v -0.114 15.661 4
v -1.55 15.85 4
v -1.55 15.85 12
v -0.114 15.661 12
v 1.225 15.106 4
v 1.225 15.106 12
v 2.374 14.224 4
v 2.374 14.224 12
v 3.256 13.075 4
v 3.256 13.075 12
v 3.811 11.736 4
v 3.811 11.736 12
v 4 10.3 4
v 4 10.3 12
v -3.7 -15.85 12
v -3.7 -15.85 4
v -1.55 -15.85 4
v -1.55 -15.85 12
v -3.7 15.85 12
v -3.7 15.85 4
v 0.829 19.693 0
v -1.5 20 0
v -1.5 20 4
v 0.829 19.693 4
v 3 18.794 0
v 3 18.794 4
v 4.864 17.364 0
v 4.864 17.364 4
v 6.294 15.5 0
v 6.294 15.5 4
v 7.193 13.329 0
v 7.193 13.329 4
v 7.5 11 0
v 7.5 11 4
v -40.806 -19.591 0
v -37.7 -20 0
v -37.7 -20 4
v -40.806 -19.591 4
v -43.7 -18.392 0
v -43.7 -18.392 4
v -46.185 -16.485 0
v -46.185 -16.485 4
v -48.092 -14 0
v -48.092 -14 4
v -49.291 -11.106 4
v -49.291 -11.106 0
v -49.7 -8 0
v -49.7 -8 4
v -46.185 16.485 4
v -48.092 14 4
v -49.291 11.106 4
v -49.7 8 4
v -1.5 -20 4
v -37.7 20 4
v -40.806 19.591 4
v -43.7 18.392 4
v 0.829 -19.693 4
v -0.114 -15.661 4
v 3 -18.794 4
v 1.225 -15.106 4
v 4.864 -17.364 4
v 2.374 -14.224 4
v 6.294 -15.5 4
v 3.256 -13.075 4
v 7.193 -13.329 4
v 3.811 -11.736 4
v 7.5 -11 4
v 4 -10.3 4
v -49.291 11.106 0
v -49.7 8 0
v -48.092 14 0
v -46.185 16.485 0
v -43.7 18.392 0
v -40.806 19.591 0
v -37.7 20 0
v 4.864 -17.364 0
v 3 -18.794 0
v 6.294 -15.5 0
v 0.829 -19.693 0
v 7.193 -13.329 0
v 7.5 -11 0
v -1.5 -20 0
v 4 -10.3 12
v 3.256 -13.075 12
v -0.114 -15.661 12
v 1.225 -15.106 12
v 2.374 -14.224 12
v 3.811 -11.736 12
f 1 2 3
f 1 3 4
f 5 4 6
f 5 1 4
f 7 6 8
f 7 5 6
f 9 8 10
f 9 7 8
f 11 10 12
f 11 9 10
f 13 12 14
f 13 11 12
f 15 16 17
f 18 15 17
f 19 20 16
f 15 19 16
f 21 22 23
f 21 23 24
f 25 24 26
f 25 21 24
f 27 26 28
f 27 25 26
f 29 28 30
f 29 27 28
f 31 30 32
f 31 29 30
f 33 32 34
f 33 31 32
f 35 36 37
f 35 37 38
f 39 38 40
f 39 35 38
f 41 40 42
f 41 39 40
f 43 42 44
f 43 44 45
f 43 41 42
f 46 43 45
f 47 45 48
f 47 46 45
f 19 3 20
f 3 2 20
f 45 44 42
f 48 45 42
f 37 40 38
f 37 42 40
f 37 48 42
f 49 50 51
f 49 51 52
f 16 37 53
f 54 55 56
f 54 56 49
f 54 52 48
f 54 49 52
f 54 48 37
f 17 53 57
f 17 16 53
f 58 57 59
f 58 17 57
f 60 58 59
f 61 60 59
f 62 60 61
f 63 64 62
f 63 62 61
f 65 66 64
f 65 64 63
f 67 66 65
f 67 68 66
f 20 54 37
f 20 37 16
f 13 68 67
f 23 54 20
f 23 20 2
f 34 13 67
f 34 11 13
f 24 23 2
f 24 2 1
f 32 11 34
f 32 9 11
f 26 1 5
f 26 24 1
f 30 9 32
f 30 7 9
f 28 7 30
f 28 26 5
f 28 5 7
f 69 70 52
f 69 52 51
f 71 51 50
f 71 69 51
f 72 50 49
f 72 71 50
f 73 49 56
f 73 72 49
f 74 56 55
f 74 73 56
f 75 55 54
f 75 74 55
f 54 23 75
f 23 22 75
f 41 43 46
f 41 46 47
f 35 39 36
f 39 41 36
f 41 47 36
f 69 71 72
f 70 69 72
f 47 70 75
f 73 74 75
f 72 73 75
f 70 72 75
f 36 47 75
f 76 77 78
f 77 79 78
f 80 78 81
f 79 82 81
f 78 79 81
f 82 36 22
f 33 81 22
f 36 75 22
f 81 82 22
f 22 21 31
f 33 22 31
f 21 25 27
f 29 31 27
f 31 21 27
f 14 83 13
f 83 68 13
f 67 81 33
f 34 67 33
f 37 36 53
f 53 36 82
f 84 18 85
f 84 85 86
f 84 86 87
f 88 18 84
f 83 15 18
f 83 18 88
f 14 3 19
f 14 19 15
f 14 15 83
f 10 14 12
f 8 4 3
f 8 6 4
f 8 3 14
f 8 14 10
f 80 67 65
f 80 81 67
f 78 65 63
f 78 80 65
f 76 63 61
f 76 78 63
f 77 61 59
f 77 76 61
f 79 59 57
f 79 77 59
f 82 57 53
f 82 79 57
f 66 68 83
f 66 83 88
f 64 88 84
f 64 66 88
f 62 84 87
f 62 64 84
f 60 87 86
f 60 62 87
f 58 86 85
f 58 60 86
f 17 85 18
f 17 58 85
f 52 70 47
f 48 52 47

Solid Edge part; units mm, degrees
sketch "Sketch1" plane through (0, 0, 0) normal (0, 0, 1) x (1, 0, 0)
  line L0 (-1.55, 15.85) -> (-3.7, 15.85)
  line L1 (-3.7, 15.85) -> (-3.7, -15.85)
  line L2 (-3.7, -15.85) -> (-1.55, -15.85)
  arc A0 (-1.55, -15.85) -> (4, -10.3) centre (-1.55, -10.3) ccw
  line L3 (4, -10.3) -> (4, 10.3)
  arc A1 (-1.55, 15.85) -> (4, 10.3) centre (-1.55, 10.3) cw
  line L4 (-1.5, 20) -> (-7.7, 20)
  line L5 (-7.7, 20) -> (-7.7, -20)
  line L6 (-7.7, -20) -> (-1.5, -20)
  arc A2 (7.5, -11) -> (-1.5, -20) centre (-1.5, -11) cw
  line L7 (7.5, -11) -> (7.5, 11)
  arc A3 (-1.5, 20) -> (7.5, 11) centre (-1.5, 11) cw
  dimension "D1" = 9
  dimension "D2" = 9
  dimension "D3" = 40
  dimension "D4" = 31.7
  dimension "D5" = 4.15
  dimension "D6" = 7.7
  dimension "D7" = 4
  dimension "D8" = 5.55
  dimension "D9" = 5.55
  dimension "D10" = 42
  dimension "D11" = 12
  dimension "D12" = 12
extrude "Protrusion1" add sketch "Sketch1" along normal blind 4
sketch "Sketch2" plane through (0, 0, 0) normal (0, 0, 1) x (1, 0, 0)
  arc A0 (-37.7, -20) -> (-49.7, -8) centre (-37.7, -8) cw
  line L0 (-49.7, 8) -> (-49.7, -8)
  arc A1 (-37.7, 20) -> (-49.7, 8) centre (-37.7, 8) ccw
  line L1 (-7.7, 20) -> (-37.7, 20)
  line L2 (-7.7, 20) -> (-7.7, -20)
  line L3 (-37.7, -20) -> (-7.7, -20)
extrude "ProtrusiónExtruida_7" add sketch "Sketch2" along normal blind 4
sketch "Sketch3" plane through (0, 0, 0) normal (0, 0, 1) x (1, 0, 0)
  line L0 (-3.7, -15.85) -> (-1.55, -15.85)
  arc A0 (-1.55, -15.85) -> (4, -10.3) centre (-1.55, -10.3) ccw
  line L1 (4, -10.3) -> (4, 10.3)
  arc A1 (-1.55, 15.85) -> (4, 10.3) centre (-1.55, 10.3) cw
  line L2 (-1.55, 15.85) -> (-3.7, 15.85)
  line L3 (-3.7, 15.85) -> (-3.7, -15.85)
extrude "ProtrusiónExtruida_8" add sketch "Sketch3" along normal blind 12
